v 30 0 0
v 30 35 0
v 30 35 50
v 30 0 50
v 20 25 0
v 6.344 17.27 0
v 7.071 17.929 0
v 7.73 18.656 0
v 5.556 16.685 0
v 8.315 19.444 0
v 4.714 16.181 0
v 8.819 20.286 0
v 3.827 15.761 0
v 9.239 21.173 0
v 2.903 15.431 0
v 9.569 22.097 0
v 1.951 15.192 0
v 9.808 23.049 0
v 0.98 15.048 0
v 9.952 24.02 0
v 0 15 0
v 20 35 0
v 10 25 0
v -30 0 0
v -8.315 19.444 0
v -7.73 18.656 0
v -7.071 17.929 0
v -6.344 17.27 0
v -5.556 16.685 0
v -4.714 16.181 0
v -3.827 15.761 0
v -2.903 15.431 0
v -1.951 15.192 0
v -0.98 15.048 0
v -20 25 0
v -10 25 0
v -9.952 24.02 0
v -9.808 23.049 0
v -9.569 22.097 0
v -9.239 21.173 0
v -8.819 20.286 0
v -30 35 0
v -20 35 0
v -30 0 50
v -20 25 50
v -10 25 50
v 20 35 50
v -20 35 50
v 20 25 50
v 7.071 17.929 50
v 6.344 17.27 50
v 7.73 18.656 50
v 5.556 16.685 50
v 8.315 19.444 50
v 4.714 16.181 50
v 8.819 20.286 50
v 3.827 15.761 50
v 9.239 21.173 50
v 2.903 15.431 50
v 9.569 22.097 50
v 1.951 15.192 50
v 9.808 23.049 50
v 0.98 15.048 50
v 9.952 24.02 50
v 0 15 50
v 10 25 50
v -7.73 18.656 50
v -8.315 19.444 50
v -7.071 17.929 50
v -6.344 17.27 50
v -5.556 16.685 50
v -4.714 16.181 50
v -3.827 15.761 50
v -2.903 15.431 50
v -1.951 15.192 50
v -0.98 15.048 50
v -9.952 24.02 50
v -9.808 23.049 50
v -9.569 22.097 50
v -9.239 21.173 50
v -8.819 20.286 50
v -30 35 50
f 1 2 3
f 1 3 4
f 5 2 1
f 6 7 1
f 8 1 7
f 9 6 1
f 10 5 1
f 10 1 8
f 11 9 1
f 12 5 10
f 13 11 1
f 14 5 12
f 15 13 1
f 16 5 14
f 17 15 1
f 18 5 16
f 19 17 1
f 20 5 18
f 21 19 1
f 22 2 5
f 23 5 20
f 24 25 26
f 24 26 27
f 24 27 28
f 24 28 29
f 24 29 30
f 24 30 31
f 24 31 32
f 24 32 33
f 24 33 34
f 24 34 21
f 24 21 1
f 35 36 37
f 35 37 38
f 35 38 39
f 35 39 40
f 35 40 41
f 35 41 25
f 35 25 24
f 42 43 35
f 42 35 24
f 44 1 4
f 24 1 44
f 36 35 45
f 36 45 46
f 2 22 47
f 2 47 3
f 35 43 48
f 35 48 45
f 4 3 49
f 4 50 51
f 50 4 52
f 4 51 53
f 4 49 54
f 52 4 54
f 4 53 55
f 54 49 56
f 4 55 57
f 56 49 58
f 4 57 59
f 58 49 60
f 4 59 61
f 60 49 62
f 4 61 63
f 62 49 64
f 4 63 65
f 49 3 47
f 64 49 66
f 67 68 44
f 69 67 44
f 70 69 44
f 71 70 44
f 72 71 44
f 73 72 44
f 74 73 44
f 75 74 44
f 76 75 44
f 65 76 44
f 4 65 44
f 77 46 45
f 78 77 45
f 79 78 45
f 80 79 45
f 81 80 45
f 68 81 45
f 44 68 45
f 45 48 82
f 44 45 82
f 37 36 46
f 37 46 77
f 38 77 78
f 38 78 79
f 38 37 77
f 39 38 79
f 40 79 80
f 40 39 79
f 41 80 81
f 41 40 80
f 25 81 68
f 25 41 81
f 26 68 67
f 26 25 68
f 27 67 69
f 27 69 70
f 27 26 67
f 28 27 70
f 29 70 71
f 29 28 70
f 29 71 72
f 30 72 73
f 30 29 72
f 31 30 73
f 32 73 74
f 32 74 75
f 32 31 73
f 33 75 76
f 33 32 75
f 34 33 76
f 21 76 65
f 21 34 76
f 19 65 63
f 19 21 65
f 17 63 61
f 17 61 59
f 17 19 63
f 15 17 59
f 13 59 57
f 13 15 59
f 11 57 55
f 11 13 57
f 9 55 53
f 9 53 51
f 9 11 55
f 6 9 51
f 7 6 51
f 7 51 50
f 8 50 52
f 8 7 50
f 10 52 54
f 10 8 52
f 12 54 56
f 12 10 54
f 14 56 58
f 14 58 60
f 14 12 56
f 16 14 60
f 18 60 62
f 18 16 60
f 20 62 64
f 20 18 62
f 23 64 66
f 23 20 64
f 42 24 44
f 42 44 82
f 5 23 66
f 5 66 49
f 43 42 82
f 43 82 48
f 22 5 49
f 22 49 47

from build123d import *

# Parameters (mm, degrees)
BOSS_EXTRUDE1_DEPTH = 50


with BuildPart() as part:
    # Sketch1 → Boss-Extrude1 (new body)
    with BuildSketch(Plane.XY):
        with BuildLine():
            Line((-20, 35), (-20, 25))
            Line((-20, 25), (-10, 25))
            ThreePointArc((-10, 25), (0, 15), (10, 25))
            Line((10, 25), (20, 25))
            Line((20, 25), (20, 35))
            Line((20, 35), (30, 35))
            Line((30, 35), (30, 0))
            Line((30, 0), (-30, 0))
            Line((-30, 0), (-30, 35))
            Line((-30, 35), (-20, 35))
        make_face()
    extrude(amount=BOSS_EXTRUDE1_DEPTH)


solid = part.part
